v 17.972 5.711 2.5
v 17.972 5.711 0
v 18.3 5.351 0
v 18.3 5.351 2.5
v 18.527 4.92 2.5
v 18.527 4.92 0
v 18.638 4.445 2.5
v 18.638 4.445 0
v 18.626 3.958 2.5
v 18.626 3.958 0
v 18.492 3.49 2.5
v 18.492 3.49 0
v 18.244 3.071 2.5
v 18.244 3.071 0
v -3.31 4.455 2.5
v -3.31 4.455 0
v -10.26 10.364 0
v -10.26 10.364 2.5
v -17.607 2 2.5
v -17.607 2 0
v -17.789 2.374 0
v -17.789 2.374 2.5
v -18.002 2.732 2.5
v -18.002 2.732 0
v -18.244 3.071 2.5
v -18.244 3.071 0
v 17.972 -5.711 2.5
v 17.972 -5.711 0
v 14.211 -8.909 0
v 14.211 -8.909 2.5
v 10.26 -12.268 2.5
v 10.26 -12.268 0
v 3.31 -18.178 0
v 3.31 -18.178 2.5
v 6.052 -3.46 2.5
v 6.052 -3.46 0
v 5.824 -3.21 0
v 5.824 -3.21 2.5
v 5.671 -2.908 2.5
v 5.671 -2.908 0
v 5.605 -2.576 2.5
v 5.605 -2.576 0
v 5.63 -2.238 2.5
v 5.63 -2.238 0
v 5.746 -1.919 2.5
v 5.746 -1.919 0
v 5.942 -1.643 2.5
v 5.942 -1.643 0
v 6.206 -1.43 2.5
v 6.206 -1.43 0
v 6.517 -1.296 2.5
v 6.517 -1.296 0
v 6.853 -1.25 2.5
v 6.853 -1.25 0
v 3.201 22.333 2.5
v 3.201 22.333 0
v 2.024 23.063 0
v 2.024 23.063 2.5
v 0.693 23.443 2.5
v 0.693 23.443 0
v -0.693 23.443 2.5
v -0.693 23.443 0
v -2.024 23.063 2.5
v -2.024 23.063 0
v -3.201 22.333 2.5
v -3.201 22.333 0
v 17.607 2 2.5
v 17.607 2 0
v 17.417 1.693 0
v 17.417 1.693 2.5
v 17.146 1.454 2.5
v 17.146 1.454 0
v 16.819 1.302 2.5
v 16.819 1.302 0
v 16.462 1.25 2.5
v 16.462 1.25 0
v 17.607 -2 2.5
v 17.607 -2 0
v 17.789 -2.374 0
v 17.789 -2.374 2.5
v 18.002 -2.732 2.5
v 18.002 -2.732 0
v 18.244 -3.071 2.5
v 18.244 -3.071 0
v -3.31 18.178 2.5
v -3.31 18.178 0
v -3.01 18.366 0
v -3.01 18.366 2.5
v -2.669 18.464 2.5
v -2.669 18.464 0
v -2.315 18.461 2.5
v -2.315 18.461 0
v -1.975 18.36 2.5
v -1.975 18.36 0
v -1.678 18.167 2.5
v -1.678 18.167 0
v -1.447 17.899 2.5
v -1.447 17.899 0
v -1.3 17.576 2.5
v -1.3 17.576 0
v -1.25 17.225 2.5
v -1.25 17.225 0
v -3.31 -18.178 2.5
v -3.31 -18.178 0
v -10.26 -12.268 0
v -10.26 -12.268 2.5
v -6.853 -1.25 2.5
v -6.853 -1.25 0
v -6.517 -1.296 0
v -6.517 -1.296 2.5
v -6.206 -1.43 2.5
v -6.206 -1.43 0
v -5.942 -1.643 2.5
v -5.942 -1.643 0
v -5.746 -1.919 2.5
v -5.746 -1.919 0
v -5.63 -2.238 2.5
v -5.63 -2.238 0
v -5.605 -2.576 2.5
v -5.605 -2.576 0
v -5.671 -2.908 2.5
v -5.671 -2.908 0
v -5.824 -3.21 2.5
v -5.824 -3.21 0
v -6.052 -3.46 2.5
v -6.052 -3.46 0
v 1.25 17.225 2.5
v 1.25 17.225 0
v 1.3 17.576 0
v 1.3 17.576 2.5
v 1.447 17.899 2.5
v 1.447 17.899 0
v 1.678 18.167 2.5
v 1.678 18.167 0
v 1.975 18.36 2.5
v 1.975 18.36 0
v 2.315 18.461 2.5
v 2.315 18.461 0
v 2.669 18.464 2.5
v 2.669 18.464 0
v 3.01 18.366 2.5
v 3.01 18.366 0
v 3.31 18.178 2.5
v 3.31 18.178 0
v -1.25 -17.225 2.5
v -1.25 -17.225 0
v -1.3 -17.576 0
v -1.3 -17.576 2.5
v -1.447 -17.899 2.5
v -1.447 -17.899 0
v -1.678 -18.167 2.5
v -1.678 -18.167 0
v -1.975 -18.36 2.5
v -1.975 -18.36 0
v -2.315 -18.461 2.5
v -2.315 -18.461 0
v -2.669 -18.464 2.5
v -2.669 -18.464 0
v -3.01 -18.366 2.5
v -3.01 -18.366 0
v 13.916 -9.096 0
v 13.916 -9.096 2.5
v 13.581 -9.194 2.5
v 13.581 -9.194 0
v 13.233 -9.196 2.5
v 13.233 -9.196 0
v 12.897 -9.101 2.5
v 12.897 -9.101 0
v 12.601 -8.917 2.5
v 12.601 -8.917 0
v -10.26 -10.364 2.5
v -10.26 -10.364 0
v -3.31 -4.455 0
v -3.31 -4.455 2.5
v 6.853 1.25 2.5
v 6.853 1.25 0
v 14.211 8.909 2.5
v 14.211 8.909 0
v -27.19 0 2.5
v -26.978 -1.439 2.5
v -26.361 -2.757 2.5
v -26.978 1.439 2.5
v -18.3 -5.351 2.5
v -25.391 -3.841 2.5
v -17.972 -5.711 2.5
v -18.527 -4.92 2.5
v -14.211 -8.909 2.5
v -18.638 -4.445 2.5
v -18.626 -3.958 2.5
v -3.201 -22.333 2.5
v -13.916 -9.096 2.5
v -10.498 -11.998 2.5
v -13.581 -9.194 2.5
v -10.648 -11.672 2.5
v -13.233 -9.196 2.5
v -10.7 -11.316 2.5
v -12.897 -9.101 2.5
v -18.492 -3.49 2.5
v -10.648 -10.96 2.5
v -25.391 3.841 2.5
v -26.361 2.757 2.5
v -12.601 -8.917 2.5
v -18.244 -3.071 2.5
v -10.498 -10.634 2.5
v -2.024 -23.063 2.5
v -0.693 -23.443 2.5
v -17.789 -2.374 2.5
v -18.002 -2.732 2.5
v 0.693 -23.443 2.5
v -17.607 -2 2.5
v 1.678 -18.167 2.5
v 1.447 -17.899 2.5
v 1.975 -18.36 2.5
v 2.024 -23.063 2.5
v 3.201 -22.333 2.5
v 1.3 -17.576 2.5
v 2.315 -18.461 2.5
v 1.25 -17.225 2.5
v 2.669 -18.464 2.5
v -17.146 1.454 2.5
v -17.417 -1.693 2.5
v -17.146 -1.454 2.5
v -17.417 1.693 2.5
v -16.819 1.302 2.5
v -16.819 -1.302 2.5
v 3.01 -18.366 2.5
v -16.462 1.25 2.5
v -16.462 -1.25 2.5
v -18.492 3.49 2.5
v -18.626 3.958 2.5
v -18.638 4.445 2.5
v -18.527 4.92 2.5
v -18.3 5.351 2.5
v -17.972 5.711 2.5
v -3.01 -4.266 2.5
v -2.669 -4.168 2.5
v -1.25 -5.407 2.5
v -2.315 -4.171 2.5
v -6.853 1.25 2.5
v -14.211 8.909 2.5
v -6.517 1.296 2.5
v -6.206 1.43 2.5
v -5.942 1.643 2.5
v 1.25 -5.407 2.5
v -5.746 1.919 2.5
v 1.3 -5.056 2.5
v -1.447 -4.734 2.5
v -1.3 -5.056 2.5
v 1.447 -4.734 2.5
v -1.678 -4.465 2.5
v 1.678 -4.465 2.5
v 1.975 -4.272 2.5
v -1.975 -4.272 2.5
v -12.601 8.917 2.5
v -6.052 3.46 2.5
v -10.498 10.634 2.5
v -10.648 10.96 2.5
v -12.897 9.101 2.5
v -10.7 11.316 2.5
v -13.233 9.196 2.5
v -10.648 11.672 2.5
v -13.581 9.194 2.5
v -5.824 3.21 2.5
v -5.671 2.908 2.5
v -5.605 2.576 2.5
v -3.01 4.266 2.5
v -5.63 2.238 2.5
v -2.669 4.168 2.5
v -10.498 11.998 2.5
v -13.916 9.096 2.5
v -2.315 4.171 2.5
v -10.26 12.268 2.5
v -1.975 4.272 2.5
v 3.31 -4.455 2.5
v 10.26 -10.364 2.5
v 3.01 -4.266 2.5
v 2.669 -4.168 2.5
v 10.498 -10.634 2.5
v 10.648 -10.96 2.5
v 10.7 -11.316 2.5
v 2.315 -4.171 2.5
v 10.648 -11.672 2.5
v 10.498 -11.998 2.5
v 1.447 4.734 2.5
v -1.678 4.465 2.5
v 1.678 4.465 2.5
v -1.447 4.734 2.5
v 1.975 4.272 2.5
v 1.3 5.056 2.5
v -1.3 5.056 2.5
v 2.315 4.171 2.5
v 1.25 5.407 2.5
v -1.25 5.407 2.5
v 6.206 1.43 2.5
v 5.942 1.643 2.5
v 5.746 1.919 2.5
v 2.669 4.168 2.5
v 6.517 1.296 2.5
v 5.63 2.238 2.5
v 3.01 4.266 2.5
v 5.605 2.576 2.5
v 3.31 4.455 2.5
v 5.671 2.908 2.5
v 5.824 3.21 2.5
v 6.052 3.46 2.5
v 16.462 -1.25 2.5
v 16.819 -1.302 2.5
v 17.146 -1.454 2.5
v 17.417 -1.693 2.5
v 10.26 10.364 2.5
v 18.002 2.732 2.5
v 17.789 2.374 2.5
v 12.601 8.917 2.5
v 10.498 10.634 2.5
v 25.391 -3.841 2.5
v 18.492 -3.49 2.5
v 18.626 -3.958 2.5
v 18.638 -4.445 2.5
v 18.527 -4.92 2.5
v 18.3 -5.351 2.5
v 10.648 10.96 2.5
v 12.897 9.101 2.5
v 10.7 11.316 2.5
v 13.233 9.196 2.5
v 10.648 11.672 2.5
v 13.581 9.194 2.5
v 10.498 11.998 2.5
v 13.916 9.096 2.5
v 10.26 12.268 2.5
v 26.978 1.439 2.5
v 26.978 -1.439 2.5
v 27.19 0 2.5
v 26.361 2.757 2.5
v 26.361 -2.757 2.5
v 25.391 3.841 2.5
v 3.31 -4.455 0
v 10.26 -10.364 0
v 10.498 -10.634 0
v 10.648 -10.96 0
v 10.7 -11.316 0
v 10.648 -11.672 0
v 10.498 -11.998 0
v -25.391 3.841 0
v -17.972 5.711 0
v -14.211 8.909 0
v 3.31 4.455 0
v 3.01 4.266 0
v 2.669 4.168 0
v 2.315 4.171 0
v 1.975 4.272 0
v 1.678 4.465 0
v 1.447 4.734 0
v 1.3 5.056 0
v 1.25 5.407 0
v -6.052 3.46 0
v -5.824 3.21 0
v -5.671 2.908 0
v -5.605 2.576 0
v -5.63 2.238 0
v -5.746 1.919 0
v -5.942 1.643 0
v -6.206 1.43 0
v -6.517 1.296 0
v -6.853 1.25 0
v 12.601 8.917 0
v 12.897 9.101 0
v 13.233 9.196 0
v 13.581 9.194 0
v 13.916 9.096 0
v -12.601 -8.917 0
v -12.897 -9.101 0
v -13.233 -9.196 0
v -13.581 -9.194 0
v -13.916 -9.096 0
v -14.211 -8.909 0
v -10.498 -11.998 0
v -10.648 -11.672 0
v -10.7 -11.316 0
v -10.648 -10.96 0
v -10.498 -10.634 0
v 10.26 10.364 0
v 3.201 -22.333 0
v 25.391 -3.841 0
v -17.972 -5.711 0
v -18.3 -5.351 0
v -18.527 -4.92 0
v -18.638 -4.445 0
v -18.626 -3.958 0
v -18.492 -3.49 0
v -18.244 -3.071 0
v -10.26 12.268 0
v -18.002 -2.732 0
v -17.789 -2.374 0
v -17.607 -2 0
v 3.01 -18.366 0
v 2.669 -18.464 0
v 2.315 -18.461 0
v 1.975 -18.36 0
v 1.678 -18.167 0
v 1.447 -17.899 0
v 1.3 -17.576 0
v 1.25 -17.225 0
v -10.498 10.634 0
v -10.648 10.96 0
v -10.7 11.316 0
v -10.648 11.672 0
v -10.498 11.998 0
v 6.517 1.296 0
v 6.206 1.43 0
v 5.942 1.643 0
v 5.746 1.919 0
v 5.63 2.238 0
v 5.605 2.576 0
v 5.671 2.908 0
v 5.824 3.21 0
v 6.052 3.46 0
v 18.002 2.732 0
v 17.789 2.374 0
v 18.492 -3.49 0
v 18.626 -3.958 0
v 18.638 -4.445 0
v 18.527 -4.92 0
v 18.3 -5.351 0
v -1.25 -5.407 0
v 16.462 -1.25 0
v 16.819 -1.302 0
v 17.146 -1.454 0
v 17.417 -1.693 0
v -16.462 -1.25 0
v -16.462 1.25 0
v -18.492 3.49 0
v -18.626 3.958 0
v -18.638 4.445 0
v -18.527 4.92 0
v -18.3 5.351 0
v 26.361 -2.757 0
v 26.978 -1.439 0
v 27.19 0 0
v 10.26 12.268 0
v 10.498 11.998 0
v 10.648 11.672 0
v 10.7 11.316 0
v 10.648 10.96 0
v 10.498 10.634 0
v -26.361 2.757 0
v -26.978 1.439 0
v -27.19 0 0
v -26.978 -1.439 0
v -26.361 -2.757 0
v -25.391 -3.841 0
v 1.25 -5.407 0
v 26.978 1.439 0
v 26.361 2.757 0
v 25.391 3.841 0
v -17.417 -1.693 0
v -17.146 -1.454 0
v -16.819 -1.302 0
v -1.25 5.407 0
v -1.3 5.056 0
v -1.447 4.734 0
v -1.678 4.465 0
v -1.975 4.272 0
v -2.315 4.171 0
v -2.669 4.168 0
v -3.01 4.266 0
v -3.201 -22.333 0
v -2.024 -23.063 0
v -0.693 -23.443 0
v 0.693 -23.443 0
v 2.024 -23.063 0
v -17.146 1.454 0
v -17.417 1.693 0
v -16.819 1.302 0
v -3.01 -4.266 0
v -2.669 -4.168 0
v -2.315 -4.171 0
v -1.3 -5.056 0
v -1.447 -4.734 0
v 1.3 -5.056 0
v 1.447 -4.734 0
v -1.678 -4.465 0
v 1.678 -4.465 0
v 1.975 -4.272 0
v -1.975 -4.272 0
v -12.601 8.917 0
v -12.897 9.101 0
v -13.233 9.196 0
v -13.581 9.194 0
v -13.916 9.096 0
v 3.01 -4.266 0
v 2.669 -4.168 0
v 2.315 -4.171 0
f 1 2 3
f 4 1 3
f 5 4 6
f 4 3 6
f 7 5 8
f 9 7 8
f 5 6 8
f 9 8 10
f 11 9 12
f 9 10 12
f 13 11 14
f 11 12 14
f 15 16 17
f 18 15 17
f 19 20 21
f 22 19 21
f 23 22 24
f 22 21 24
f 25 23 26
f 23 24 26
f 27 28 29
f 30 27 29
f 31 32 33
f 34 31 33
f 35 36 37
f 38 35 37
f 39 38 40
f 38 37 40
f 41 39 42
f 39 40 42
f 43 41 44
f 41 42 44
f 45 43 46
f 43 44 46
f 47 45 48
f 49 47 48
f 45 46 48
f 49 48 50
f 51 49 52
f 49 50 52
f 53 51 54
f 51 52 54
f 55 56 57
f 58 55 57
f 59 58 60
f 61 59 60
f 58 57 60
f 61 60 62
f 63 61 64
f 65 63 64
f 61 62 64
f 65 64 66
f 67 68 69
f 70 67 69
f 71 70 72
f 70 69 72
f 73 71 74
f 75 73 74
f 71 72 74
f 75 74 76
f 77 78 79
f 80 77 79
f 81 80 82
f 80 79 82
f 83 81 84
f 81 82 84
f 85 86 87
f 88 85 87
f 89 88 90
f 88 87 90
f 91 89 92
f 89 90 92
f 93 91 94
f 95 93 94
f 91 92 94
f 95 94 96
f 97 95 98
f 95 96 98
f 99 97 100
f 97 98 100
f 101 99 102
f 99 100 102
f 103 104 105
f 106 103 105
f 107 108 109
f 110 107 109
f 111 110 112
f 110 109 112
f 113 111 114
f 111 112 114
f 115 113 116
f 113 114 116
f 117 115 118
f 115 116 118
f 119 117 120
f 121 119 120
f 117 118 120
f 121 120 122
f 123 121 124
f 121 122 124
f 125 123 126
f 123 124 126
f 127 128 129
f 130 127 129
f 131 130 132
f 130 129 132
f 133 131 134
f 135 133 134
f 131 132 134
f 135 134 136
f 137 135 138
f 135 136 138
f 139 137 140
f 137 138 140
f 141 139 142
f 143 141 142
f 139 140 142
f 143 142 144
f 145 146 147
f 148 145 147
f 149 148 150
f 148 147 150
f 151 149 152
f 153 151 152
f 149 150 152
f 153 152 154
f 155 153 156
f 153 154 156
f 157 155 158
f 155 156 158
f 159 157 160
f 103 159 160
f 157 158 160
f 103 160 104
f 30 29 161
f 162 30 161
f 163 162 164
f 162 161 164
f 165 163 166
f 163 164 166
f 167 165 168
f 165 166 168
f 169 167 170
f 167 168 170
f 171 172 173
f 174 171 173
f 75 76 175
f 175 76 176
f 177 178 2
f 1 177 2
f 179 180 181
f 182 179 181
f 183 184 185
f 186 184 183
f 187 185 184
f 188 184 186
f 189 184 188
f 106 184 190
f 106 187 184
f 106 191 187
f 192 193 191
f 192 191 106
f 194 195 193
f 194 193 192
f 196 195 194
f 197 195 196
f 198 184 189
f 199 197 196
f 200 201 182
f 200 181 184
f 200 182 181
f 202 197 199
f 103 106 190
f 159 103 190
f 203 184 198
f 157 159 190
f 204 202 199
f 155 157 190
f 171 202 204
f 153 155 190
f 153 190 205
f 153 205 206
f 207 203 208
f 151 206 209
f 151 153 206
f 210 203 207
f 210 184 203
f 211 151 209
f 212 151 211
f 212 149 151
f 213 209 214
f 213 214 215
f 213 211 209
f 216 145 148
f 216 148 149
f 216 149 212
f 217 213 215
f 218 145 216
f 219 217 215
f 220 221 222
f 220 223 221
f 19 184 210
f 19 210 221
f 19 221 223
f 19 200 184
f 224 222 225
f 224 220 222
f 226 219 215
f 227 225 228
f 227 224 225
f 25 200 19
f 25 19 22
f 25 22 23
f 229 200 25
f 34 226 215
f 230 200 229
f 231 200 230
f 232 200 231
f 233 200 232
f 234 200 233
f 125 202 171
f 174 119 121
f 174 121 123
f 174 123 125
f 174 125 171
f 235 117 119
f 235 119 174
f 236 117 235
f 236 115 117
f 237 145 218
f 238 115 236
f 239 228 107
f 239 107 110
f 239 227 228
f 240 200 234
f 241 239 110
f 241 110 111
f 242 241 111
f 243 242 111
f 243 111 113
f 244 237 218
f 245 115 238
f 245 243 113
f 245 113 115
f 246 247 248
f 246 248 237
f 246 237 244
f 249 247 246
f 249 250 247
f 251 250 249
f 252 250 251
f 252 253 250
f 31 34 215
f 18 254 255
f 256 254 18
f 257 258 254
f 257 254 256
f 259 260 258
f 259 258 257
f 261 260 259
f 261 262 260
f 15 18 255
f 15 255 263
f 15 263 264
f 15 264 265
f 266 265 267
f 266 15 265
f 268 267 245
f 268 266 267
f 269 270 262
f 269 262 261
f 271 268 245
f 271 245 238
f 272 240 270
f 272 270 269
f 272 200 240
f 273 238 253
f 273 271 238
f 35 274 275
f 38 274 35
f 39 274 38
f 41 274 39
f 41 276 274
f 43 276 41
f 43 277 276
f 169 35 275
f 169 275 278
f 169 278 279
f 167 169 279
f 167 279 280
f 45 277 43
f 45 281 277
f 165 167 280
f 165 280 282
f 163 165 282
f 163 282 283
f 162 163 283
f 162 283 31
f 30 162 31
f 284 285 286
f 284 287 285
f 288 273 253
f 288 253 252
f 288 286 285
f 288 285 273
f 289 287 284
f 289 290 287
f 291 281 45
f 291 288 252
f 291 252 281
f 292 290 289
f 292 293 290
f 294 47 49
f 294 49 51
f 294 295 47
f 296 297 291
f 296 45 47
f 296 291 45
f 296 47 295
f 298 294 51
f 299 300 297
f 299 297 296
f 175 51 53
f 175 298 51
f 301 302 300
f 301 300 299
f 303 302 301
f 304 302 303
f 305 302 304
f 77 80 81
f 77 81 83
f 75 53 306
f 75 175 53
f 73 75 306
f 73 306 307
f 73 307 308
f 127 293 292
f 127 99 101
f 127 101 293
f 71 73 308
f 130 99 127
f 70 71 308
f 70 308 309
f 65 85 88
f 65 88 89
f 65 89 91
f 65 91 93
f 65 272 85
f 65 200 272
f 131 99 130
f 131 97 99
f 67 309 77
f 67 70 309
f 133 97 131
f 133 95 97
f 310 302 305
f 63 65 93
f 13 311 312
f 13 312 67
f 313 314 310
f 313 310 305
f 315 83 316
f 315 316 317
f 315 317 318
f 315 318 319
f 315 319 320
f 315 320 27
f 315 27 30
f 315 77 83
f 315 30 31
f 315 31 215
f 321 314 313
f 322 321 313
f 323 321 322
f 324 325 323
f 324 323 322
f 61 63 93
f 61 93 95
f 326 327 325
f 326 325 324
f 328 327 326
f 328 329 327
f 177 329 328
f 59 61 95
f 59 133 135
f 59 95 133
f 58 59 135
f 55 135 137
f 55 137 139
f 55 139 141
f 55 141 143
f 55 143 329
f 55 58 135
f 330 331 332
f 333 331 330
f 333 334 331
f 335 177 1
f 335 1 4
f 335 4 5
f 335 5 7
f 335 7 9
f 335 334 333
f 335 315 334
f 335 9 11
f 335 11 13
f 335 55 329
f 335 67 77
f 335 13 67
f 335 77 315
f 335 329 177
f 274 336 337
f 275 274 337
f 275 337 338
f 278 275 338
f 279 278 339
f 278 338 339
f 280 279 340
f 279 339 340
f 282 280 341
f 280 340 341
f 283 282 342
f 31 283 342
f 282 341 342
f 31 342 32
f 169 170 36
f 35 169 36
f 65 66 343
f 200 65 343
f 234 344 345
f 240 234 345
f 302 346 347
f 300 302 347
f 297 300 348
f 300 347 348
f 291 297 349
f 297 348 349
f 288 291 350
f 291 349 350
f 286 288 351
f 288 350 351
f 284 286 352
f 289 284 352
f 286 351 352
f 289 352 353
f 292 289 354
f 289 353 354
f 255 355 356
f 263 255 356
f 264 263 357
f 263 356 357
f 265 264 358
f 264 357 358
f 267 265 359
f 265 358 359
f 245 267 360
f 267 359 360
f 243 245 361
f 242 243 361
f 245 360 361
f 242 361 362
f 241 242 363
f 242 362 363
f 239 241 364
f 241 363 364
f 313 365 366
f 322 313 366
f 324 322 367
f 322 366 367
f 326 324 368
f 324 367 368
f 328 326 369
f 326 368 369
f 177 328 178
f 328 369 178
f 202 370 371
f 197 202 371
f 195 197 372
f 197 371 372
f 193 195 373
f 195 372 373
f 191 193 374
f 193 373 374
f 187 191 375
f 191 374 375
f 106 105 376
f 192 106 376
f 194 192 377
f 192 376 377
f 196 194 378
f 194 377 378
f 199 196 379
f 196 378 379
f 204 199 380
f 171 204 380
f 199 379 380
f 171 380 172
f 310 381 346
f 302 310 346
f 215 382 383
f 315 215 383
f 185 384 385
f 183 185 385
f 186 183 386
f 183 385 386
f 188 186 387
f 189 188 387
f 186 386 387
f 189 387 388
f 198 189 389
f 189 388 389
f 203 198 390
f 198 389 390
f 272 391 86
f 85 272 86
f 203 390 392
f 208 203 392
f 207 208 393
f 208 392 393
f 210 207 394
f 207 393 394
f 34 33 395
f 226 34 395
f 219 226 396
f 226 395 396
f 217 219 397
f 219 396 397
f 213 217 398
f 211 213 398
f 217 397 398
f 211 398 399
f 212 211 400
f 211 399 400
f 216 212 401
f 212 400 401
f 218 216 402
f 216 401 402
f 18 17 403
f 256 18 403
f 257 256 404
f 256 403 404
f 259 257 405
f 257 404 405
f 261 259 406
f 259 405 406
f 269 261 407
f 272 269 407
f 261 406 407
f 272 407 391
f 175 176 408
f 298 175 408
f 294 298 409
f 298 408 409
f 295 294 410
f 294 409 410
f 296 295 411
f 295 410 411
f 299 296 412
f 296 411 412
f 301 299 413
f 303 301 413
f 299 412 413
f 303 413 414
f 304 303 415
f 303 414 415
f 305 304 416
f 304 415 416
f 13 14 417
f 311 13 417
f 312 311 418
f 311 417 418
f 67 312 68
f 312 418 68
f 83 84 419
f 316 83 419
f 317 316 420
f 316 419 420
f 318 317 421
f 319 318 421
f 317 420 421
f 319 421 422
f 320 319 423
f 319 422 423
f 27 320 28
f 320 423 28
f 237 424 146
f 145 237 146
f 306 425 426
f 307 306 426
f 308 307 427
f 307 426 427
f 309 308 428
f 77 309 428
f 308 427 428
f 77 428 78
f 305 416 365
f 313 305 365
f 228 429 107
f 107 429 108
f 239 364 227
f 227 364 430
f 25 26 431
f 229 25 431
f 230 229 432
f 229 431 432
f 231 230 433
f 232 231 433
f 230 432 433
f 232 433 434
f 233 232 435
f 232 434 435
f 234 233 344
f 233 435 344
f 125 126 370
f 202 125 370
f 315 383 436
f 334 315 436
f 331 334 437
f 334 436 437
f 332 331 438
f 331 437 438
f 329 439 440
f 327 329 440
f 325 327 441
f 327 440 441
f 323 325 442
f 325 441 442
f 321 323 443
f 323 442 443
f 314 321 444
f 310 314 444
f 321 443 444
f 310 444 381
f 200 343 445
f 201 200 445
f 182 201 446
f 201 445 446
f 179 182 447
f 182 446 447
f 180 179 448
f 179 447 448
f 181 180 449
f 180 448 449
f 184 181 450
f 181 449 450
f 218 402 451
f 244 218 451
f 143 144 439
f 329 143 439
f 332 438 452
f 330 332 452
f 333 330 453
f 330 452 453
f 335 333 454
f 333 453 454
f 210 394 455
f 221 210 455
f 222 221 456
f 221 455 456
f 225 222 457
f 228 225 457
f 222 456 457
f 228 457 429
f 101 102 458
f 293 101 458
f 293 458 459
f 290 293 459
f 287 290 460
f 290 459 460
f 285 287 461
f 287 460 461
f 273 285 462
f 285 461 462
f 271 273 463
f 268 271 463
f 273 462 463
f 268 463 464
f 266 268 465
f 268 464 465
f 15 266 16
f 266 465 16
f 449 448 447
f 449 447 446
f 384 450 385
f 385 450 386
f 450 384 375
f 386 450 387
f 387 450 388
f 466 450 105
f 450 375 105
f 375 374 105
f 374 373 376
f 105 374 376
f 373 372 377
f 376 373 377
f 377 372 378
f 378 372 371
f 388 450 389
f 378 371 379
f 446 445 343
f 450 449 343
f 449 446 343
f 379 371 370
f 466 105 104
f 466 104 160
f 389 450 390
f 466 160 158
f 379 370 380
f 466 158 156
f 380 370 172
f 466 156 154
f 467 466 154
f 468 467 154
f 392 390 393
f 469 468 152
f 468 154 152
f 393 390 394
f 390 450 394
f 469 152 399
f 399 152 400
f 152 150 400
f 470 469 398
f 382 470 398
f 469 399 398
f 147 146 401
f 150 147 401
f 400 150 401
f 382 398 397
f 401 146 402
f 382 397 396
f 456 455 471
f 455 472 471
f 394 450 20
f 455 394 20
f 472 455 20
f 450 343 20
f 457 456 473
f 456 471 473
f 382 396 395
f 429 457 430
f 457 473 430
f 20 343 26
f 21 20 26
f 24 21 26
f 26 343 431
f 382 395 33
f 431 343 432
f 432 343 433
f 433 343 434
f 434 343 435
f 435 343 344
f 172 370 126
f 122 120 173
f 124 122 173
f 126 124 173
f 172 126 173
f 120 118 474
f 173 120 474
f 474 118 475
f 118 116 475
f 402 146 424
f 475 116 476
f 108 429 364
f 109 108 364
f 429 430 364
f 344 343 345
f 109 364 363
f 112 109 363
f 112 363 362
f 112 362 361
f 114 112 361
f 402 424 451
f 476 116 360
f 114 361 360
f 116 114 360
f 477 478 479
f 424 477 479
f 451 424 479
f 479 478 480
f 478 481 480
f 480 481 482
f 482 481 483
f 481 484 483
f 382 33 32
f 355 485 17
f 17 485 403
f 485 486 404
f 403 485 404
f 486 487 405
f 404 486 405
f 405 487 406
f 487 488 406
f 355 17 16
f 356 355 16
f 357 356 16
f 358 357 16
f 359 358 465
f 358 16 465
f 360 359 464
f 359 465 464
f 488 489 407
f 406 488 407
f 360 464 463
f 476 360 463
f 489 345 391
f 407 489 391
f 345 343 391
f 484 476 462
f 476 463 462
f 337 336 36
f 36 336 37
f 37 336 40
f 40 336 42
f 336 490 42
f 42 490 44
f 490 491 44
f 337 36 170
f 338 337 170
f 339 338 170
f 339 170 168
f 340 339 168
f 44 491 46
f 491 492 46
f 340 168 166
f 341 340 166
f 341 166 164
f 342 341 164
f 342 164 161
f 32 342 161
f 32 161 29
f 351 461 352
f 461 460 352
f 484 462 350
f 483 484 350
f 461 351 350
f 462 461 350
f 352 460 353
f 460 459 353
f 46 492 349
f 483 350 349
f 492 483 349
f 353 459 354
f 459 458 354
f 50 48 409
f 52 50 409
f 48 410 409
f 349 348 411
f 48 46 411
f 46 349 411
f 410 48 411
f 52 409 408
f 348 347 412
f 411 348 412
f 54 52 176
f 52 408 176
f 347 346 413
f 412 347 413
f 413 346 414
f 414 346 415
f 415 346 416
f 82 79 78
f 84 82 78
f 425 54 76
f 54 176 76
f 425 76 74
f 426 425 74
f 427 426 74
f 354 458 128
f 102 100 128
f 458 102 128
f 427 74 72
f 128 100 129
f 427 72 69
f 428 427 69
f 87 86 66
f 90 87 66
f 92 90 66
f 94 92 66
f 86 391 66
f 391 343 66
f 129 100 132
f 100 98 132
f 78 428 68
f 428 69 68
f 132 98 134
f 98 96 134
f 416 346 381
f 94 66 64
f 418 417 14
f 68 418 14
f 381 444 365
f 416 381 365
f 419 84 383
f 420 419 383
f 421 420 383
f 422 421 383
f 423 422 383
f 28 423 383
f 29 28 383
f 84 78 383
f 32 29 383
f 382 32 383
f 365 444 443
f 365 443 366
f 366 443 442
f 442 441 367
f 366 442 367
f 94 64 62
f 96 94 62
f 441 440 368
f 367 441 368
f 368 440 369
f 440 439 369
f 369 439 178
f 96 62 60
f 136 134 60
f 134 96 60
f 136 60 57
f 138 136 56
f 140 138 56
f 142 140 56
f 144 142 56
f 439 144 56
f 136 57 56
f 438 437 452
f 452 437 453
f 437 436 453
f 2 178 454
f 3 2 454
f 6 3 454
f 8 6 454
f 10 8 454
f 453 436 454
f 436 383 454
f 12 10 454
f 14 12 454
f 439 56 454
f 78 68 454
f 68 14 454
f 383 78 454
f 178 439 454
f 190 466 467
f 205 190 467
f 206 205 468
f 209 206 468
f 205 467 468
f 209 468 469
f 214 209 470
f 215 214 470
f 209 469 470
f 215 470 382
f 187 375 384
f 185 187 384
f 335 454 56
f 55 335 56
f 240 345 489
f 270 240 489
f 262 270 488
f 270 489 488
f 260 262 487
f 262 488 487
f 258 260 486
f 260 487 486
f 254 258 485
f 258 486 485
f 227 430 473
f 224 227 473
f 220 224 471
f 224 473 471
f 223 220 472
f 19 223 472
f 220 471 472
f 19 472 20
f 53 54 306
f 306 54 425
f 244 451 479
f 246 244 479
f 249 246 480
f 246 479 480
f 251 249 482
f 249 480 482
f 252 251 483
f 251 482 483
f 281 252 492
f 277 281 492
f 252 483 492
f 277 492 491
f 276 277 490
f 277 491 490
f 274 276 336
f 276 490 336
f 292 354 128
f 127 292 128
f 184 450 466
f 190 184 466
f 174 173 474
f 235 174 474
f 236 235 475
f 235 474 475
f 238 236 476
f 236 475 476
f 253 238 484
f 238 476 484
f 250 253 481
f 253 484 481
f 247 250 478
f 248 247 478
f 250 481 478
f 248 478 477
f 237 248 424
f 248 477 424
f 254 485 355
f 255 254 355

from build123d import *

# Parameters (mm, degrees)
F0_R     = 2.5
F1_DEPTH = 2.5


with BuildPart() as f1:
    # F0 (on Top) → F1 (new body)
    with BuildSketch(Plane.XY):
        with BuildLine():
            Line((-3.200922, 22.332565), (-25.390672, 3.841106))
            ThreePointArc((-25.390672, 3.841106), (-21.653839, 4.971197), (-18.243719, 3.070641))
            ThreePointArc((-18.243719, 3.070641), (-18.63819, 4.44548), (-17.972234, 5.711296))
            Line((-17.972234, 5.711296), (-14.210711, 8.909378))
            ThreePointArc((-14.210711, 8.909378), (-13.407208, 9.207037), (-12.600804, 8.917329))
            Line((-12.600804, 8.917329), (-6.052341, 3.460277))
            ThreePointArc((-6.052341, 3.460277), (-5.677232, 2.074468), (-6.852572, 1.25))
            Line((-6.852572, 1.25), (-16.461531, 1.25))
            ThreePointArc((-16.461531, 1.25), (-17.146184, 1.454175), (-17.607175, 2))
            ThreePointArc((-17.607175, 2), (-17.295219, 1.021548), (-17.18975, 0))
            ThreePointArc((-17.18975, 0), (-17.295219, -1.021548), (-17.607175, -2))
            ThreePointArc((-17.607175, -2), (-17.146184, -1.454175), (-16.461531, -1.25))
            Line((-16.461531, -1.25), (-6.852572, -1.25))
            ThreePointArc((-6.852572, -1.25), (-5.677232, -2.074468), (-6.052341, -3.460277))
            Line((-6.052341, -3.460277), (-12.600804, -8.917329))
            ThreePointArc((-12.600804, -8.917329), (-13.407208, -9.207037), (-14.210711, -8.909378))
            Line((-14.210711, -8.909378), (-17.972234, -5.711296))
            ThreePointArc((-17.972234, -5.711296), (-18.63819, -4.44548), (-18.243719, -3.070641))
            ThreePointArc((-18.243719, -3.070641), (-21.653839, -4.971197), (-25.390672, -3.841106))
            Line((-25.390672, -3.841106), (-3.200922, -22.332565))
            ThreePointArc((-3.200922, -22.332565), (0, -23.491459), (3.200922, -22.332565))
            Line((3.200922, -22.332565), (25.390672, -3.841106))
            ThreePointArc((25.390672, -3.841106), (21.653839, -4.971197), (18.243719, -3.070641))
            ThreePointArc((18.243719, -3.070641), (18.63819, -4.44548), (17.972234, -5.711296))
            Line((17.972234, -5.711296), (14.210711, -8.909378))
            ThreePointArc((14.210711, -8.909378), (13.407208, -9.207037), (12.600804, -8.917329))
            Line((12.600804, -8.917329), (6.052341, -3.460277))
            ThreePointArc((6.052341, -3.460277), (5.677232, -2.074468), (6.852572, -1.25))
            Line((6.852572, -1.25), (16.461531, -1.25))
            ThreePointArc((16.461531, -1.25), (17.146184, -1.454175), (17.607175, -2))
            ThreePointArc((17.607175, -2), (17.18975, 0), (17.607175, 2))
            ThreePointArc((17.607175, 2), (17.146184, 1.454175), (16.461531, 1.25))
            Line((16.461531, 1.25), (6.852572, 1.25))
            ThreePointArc((6.852572, 1.25), (5.677232, 2.074468), (6.052341, 3.460277))
            Line((6.052341, 3.460277), (12.600804, 8.917329))
            ThreePointArc((12.600804, 8.917329), (13.407208, 9.207037), (14.210711, 8.909378))
            Line((14.210711, 8.909378), (17.972234, 5.711296))
            ThreePointArc((17.972234, 5.711296), (18.63819, 4.44548), (18.243719, 3.070641))
            ThreePointArc((18.243719, 3.070641), (21.653839, 4.971197), (25.390672, 3.841106))
            Line((25.390672, 3.841106), (3.200922, 22.332565))
            ThreePointArc((3.200922, 22.332565), (0, 23.491459), (-3.200922, 22.332565))
        make_face()
        with BuildLine():
            Line((-10.259876, -10.363764), (-3.309676, -4.454638))
            ThreePointArc((-3.309676, -4.454638), (-1.975403, -4.272372), (-1.25, -5.406964))
            Line((-1.25, -5.406964), (-1.25, -17.225215))
            ThreePointArc((-1.25, -17.225215), (-1.975403, -18.359806), (-3.309676, -18.177541))
            Line((-3.309676, -18.177541), (-10.259876, -12.268415))
            ThreePointArc((-10.259876, -12.268415), (-10.7002, -11.316089), (-10.259876, -10.363764))
        make_face(mode=Mode.SUBTRACT)
        with BuildLine():
            ThreePointArc((1.25, -5.406964), (1.975403, -4.272372), (3.309676, -4.454638))
            Line((3.309676, -4.454638), (10.259876, -10.363764))
            ThreePointArc((10.259876, -10.363764), (10.7002, -11.316089), (10.259876, -12.268415))
            Line((10.259876, -12.268415), (3.309676, -18.177541))
            ThreePointArc((3.309676, -18.177541), (1.975403, -18.359806), (1.25, -17.225215))
            Line((1.25, -17.225215), (1.25, -5.406964))
        make_face(mode=Mode.SUBTRACT)
        with BuildLine():
            Line((-1.25, 17.225215), (-1.25, 5.406964))
            ThreePointArc((-1.25, 5.406964), (-1.975403, 4.272372), (-3.309676, 4.454638))
            Line((-3.309676, 4.454638), (-10.259876, 10.363764))
            ThreePointArc((-10.259876, 10.363764), (-10.7002, 11.316089), (-10.259876, 12.268415))
            Line((-10.259876, 12.268415), (-3.309676, 18.177541))
            ThreePointArc((-3.309676, 18.177541), (-1.975403, 18.359806), (-1.25, 17.225215))
        make_face(mode=Mode.SUBTRACT)
        with BuildLine():
            ThreePointArc((3.309676, 4.454638), (1.975403, 4.272372), (1.25, 5.406964))
            Line((1.25, 5.406964), (1.25, 17.225215))
            ThreePointArc((1.25, 17.225215), (1.975403, 18.359806), (3.309676, 18.177541))
            Line((3.309676, 18.177541), (10.259876, 12.268415))
            ThreePointArc((10.259876, 12.268415), (10.7002, 11.316089), (10.259876, 10.363764))
            Line((10.259876, 10.363764), (3.309676, 4.454638))
        make_face(mode=Mode.SUBTRACT)
        with BuildLine():
            ThreePointArc((-18.243719, 3.070641), (-21.653839, 4.971197), (-25.390672, 3.841106))
            ThreePointArc((-25.390672, 3.841106), (-27.18975, 0), (-25.390672, -3.841106))
            ThreePointArc((-25.390672, -3.841106), (-21.653839, -4.971197), (-18.243719, -3.070641))
            ThreePointArc((-18.243719, -3.070641), (-17.891977, -2.55522), (-17.607175, -2))
            ThreePointArc((-17.607175, -2), (-17.295219, -1.021548), (-17.18975, 0))
            ThreePointArc((-17.18975, 0), (-17.295219, 1.021548), (-17.607175, 2))
            ThreePointArc((-17.607175, 2), (-17.891977, 2.55522), (-18.243719, 3.070641))
        make_face()
        with Locations((-22.18975, 0)):
            Circle(F0_R, mode=Mode.SUBTRACT)
        with Locations((-22.18975, 0)):
            Circle(F0_R)
        with BuildLine():
            ThreePointArc((27.18975, 0), (26.717697, 2.120777), (25.390672, 3.841106))
            ThreePointArc((25.390672, 3.841106), (21.653839, 4.971197), (18.243719, 3.070641))
            ThreePointArc((18.243719, 3.070641), (17.891977, 2.55522), (17.607175, 2))
            ThreePointArc((17.607175, 2), (17.18975, 0), (17.607175, -2))
            ThreePointArc((17.607175, -2), (17.891977, -2.55522), (18.243719, -3.070641))
            ThreePointArc((18.243719, -3.070641), (21.653839, -4.971197), (25.390672, -3.841106))
            ThreePointArc((25.390672, -3.841106), (26.717697, -2.120777), (27.18975, 0))
        make_face()
        with Locations((22.18975, 0)):
            Circle(F0_R, mode=Mode.SUBTRACT)
        with Locations((22.18975, 0)):
            Circle(F0_R)
    extrude(amount=F1_DEPTH)


solid = f1.part
